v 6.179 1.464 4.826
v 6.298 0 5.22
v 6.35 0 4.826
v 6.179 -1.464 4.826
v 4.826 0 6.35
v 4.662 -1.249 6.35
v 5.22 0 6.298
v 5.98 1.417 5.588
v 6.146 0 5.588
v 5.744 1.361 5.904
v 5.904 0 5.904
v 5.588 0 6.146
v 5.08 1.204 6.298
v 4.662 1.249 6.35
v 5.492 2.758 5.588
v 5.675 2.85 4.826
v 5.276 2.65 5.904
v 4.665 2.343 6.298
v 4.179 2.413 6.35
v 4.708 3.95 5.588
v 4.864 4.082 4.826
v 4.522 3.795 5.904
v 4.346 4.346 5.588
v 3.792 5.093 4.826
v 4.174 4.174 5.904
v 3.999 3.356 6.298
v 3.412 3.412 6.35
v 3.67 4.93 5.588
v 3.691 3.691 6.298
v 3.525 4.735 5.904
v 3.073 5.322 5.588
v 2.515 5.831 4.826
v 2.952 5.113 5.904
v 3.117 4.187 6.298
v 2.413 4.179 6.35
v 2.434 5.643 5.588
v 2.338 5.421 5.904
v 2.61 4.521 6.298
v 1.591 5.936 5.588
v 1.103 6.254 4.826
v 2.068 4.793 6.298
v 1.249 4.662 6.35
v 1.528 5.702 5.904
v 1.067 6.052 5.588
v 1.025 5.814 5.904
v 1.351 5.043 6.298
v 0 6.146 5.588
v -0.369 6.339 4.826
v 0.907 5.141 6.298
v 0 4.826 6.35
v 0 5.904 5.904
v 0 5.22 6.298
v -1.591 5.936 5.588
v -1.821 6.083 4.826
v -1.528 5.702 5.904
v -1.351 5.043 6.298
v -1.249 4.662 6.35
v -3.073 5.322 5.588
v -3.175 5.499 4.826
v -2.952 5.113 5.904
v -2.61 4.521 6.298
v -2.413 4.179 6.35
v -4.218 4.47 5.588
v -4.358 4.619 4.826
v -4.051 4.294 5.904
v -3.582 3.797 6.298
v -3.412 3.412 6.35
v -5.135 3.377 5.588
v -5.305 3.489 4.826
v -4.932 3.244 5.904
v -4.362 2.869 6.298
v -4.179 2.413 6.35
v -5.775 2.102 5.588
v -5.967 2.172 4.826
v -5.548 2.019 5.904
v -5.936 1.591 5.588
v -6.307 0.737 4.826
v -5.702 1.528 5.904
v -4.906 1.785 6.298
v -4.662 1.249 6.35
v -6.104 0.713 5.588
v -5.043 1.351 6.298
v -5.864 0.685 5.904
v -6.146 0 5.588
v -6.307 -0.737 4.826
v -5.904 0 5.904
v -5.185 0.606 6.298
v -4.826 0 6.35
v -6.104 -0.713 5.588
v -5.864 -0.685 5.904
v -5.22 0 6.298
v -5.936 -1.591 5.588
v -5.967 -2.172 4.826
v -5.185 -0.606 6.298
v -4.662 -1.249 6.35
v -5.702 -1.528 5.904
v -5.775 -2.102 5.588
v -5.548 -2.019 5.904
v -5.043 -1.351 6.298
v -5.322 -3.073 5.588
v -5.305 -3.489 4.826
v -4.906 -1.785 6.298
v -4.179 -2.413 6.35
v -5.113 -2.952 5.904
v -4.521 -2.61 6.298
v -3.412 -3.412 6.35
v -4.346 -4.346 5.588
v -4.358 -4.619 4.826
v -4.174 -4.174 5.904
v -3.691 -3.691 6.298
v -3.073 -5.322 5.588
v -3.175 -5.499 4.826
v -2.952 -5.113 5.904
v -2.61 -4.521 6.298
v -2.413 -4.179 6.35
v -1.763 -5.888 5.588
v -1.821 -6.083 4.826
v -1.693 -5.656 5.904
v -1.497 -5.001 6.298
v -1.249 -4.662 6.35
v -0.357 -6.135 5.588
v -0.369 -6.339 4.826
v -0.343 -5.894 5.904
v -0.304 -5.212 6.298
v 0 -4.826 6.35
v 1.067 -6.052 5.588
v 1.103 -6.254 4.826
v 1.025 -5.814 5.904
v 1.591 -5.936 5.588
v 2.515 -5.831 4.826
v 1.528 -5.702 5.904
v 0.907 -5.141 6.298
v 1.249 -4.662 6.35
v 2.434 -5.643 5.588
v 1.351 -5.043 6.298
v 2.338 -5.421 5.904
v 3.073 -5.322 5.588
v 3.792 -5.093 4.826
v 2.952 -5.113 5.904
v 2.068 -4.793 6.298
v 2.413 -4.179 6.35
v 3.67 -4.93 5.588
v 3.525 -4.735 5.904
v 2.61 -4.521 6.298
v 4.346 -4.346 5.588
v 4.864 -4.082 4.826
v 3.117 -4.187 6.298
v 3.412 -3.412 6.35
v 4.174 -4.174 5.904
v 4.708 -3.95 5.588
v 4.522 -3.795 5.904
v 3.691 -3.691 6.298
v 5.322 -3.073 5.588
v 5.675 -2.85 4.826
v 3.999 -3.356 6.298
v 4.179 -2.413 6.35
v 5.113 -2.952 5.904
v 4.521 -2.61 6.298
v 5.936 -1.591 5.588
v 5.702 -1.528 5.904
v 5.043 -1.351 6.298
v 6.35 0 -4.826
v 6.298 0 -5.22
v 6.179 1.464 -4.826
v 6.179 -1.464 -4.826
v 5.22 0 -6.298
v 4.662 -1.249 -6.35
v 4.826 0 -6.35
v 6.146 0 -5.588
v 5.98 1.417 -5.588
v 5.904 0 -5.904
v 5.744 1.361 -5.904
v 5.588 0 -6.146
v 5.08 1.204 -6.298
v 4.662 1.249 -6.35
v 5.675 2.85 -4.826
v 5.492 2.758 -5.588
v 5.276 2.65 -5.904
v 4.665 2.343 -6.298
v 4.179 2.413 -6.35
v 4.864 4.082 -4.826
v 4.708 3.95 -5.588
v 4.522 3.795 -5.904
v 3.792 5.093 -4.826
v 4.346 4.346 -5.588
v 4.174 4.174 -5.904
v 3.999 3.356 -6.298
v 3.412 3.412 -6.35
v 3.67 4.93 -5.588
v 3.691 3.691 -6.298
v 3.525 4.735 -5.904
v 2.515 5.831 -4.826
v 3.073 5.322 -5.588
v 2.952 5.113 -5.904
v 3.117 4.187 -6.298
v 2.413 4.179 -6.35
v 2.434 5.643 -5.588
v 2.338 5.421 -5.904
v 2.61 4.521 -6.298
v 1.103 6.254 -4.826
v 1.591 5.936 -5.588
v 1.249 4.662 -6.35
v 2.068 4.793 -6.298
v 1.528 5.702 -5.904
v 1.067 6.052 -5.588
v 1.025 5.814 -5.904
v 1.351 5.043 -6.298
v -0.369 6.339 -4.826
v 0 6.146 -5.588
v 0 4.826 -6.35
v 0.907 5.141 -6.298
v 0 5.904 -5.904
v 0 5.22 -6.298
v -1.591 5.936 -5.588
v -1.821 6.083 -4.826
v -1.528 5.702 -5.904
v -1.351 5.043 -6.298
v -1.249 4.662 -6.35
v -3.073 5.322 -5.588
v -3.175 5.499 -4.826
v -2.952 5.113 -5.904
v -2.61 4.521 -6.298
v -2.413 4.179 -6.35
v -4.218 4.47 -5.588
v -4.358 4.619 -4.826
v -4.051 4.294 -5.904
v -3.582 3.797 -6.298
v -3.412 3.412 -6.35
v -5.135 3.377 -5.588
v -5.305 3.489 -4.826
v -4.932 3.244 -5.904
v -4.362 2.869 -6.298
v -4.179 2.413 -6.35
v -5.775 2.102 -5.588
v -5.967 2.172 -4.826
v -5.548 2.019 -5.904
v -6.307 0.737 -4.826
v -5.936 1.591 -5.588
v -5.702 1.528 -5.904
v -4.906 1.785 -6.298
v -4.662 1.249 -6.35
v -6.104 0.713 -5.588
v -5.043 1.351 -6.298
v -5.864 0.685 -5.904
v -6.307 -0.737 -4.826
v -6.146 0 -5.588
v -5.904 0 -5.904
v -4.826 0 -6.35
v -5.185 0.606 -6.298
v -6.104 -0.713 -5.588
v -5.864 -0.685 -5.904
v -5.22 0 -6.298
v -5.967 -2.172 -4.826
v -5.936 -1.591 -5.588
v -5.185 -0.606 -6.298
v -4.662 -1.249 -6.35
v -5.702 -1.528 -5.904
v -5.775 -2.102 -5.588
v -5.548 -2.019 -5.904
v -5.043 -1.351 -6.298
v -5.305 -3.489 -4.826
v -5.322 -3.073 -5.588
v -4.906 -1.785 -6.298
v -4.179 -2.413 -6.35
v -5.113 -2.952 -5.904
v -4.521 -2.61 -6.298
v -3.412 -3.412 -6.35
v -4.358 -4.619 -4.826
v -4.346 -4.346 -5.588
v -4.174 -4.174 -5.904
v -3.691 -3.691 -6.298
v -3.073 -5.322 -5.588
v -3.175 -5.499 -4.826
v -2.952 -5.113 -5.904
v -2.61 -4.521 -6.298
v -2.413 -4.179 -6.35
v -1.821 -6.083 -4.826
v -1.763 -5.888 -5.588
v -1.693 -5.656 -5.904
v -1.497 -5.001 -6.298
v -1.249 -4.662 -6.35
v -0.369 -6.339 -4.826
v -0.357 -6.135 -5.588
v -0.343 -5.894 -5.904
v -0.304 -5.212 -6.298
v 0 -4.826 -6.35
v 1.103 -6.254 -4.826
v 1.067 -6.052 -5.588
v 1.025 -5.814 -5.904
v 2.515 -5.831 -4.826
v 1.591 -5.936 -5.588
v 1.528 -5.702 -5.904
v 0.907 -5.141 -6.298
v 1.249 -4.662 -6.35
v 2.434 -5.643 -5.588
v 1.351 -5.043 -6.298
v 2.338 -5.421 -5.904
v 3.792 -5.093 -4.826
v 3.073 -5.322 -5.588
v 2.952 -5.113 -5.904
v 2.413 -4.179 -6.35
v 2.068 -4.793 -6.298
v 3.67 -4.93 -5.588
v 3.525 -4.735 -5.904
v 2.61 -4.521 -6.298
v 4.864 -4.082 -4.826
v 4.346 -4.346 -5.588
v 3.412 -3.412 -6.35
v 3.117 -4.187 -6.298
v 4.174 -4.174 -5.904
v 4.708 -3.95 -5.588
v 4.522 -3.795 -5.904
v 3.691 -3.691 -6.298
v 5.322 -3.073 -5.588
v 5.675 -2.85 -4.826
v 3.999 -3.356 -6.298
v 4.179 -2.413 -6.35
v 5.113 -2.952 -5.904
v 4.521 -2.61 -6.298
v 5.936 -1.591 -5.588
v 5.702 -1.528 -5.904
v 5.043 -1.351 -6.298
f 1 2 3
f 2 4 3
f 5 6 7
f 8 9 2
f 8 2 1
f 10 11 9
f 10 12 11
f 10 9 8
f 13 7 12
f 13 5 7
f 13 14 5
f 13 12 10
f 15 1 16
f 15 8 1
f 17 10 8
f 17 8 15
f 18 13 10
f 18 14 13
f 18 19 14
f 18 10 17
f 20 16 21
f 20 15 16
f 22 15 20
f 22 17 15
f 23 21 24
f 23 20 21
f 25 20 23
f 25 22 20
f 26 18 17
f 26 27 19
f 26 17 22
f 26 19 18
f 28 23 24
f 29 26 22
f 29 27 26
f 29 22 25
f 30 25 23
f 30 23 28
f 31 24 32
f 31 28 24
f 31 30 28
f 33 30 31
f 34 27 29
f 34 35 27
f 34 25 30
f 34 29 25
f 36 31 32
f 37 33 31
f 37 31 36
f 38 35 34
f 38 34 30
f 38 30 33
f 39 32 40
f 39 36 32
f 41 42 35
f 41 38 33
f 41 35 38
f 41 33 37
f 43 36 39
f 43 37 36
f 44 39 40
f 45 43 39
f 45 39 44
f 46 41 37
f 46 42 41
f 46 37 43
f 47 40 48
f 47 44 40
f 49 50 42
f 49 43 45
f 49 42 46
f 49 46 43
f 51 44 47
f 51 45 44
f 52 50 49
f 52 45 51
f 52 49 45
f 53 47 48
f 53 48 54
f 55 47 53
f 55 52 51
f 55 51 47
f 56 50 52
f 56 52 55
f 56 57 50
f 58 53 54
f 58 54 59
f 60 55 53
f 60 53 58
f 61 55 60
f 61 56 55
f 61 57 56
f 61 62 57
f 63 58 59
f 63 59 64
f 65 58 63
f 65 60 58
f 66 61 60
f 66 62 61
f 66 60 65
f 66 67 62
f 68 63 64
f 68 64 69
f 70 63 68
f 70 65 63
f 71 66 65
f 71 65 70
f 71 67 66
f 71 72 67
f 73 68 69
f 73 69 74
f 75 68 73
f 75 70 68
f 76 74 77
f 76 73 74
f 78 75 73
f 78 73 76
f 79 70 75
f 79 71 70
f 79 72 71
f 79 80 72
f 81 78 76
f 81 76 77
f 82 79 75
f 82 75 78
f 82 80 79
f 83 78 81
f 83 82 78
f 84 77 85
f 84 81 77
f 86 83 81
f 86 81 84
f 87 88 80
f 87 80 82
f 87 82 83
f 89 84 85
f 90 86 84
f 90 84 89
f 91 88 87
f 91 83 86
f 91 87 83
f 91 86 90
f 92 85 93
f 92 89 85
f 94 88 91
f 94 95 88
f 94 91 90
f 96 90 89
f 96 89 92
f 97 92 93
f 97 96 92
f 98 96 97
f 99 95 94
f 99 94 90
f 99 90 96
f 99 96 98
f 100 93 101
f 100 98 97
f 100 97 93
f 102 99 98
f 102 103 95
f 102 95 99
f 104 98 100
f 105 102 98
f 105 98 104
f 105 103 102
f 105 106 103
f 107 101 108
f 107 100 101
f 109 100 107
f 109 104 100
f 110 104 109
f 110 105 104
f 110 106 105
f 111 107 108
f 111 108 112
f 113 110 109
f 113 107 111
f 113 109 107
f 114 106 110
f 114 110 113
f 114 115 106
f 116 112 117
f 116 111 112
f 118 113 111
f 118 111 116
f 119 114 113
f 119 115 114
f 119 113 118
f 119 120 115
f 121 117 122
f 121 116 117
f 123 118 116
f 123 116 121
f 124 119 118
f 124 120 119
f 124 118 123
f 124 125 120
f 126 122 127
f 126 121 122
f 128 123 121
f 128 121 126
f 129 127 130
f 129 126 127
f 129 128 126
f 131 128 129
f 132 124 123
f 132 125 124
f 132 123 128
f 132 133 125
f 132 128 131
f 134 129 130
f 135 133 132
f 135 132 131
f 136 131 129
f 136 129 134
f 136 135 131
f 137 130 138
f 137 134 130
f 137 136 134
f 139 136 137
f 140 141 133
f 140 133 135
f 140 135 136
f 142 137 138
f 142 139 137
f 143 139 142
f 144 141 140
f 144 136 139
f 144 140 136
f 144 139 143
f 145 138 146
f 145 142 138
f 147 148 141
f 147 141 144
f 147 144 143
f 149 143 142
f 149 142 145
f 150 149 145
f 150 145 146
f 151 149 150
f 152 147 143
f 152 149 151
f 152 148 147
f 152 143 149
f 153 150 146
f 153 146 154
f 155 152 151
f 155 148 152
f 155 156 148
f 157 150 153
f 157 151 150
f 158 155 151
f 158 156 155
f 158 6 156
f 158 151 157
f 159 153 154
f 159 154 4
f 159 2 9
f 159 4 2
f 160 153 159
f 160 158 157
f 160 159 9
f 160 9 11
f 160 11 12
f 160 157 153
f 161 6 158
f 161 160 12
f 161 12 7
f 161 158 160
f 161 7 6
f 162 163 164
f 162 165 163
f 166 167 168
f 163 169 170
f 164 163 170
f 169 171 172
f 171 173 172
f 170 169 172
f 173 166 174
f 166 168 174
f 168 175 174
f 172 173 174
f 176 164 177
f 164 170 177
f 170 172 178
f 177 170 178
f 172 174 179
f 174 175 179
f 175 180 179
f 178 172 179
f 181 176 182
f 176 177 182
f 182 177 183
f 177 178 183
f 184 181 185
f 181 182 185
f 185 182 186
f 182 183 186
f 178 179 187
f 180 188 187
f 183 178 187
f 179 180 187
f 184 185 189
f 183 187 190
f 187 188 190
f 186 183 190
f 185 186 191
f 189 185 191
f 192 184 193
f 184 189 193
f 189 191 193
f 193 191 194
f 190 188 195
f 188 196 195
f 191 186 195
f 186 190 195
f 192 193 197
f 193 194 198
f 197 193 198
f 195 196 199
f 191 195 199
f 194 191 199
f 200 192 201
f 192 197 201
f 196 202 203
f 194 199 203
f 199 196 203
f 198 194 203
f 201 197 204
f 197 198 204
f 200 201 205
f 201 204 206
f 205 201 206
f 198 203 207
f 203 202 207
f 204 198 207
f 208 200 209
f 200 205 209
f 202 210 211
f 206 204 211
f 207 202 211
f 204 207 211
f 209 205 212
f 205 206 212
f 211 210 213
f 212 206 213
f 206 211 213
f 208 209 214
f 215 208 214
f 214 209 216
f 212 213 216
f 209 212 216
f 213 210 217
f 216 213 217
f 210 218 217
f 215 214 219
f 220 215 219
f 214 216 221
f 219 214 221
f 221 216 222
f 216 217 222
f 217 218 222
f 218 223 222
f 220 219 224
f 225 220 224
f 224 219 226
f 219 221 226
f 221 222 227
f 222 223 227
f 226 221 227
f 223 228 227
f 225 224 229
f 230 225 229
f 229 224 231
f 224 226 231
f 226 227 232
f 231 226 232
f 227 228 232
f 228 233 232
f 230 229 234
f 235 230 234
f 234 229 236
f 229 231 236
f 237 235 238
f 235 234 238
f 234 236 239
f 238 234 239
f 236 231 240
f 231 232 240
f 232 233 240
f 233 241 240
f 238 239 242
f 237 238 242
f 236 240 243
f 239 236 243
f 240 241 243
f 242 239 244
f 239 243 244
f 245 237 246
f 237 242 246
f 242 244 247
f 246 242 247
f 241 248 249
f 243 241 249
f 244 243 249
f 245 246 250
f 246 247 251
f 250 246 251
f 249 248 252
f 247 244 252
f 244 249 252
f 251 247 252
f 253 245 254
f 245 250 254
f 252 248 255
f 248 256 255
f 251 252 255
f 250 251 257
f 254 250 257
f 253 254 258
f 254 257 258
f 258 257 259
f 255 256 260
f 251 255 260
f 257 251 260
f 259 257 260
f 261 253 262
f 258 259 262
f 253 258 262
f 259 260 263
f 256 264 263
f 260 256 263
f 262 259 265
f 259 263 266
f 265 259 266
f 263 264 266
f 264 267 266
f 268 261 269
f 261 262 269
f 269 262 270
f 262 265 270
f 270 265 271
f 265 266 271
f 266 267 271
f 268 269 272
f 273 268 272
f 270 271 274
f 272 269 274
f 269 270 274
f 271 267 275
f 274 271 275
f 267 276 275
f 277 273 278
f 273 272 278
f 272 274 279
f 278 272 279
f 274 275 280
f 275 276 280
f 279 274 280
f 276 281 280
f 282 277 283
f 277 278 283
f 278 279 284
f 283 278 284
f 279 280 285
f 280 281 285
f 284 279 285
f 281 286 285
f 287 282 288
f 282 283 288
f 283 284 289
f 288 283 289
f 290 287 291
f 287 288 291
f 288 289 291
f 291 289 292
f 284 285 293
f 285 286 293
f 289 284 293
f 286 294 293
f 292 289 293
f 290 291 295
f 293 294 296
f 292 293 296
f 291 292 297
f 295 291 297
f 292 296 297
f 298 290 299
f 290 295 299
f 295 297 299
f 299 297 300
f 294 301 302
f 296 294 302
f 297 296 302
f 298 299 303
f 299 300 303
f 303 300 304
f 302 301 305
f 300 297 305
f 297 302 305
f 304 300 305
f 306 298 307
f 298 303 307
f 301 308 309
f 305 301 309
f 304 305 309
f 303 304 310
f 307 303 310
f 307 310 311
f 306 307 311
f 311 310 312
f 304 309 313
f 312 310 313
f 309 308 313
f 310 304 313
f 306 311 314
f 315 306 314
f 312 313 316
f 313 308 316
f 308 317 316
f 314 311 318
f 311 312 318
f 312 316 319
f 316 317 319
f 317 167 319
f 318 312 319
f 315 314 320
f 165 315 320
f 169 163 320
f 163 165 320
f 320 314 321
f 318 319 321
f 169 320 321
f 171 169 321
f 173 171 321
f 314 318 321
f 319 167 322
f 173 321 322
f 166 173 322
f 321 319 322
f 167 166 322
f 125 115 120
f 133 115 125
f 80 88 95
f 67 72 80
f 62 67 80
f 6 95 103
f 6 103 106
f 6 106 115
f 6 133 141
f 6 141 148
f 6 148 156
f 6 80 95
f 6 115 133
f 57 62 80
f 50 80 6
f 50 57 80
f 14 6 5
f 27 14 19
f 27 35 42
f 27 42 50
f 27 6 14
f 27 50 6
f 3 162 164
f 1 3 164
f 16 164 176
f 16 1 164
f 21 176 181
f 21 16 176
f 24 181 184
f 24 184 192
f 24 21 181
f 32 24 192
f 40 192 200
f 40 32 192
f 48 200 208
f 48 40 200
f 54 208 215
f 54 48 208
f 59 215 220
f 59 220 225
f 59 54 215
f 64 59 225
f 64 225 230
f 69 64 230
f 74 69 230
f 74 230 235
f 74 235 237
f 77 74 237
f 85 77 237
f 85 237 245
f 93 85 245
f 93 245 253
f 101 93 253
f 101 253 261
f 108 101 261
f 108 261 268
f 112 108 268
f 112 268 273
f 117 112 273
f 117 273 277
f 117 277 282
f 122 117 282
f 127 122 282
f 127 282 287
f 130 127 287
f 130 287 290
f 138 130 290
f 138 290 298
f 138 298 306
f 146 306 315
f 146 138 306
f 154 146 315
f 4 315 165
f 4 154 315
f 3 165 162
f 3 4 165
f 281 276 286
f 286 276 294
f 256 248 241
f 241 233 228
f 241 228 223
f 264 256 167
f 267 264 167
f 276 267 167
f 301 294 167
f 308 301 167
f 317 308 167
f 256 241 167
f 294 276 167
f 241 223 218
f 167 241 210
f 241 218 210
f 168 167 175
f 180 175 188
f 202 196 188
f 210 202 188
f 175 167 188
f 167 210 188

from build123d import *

# Parameters (mm, degrees)
F0_R     = 6.35
F1_DEPTH = 6.35
F2_R     = 1.524
F3_R     = 1.524


with BuildPart() as f1:
    # F0 (on Top) → F1 (new body, symmetric)
    with BuildSketch(Plane.XY):
        Circle(F0_R)
    extrude(amount=F1_DEPTH, both=True)

    # F2
    f2_edges = [f1.edges().sort_by_distance(p)[0] for p in [
        (-6.35, 0, -6.35),
    ]]
    fillet(f2_edges, radius=F2_R)

    # F3
    f3_edges = [f1.edges().sort_by_distance(p)[0] for p in [
        (-6.35, 0, 6.35),
    ]]
    fillet(f3_edges, radius=F3_R)


solid = f1.part
